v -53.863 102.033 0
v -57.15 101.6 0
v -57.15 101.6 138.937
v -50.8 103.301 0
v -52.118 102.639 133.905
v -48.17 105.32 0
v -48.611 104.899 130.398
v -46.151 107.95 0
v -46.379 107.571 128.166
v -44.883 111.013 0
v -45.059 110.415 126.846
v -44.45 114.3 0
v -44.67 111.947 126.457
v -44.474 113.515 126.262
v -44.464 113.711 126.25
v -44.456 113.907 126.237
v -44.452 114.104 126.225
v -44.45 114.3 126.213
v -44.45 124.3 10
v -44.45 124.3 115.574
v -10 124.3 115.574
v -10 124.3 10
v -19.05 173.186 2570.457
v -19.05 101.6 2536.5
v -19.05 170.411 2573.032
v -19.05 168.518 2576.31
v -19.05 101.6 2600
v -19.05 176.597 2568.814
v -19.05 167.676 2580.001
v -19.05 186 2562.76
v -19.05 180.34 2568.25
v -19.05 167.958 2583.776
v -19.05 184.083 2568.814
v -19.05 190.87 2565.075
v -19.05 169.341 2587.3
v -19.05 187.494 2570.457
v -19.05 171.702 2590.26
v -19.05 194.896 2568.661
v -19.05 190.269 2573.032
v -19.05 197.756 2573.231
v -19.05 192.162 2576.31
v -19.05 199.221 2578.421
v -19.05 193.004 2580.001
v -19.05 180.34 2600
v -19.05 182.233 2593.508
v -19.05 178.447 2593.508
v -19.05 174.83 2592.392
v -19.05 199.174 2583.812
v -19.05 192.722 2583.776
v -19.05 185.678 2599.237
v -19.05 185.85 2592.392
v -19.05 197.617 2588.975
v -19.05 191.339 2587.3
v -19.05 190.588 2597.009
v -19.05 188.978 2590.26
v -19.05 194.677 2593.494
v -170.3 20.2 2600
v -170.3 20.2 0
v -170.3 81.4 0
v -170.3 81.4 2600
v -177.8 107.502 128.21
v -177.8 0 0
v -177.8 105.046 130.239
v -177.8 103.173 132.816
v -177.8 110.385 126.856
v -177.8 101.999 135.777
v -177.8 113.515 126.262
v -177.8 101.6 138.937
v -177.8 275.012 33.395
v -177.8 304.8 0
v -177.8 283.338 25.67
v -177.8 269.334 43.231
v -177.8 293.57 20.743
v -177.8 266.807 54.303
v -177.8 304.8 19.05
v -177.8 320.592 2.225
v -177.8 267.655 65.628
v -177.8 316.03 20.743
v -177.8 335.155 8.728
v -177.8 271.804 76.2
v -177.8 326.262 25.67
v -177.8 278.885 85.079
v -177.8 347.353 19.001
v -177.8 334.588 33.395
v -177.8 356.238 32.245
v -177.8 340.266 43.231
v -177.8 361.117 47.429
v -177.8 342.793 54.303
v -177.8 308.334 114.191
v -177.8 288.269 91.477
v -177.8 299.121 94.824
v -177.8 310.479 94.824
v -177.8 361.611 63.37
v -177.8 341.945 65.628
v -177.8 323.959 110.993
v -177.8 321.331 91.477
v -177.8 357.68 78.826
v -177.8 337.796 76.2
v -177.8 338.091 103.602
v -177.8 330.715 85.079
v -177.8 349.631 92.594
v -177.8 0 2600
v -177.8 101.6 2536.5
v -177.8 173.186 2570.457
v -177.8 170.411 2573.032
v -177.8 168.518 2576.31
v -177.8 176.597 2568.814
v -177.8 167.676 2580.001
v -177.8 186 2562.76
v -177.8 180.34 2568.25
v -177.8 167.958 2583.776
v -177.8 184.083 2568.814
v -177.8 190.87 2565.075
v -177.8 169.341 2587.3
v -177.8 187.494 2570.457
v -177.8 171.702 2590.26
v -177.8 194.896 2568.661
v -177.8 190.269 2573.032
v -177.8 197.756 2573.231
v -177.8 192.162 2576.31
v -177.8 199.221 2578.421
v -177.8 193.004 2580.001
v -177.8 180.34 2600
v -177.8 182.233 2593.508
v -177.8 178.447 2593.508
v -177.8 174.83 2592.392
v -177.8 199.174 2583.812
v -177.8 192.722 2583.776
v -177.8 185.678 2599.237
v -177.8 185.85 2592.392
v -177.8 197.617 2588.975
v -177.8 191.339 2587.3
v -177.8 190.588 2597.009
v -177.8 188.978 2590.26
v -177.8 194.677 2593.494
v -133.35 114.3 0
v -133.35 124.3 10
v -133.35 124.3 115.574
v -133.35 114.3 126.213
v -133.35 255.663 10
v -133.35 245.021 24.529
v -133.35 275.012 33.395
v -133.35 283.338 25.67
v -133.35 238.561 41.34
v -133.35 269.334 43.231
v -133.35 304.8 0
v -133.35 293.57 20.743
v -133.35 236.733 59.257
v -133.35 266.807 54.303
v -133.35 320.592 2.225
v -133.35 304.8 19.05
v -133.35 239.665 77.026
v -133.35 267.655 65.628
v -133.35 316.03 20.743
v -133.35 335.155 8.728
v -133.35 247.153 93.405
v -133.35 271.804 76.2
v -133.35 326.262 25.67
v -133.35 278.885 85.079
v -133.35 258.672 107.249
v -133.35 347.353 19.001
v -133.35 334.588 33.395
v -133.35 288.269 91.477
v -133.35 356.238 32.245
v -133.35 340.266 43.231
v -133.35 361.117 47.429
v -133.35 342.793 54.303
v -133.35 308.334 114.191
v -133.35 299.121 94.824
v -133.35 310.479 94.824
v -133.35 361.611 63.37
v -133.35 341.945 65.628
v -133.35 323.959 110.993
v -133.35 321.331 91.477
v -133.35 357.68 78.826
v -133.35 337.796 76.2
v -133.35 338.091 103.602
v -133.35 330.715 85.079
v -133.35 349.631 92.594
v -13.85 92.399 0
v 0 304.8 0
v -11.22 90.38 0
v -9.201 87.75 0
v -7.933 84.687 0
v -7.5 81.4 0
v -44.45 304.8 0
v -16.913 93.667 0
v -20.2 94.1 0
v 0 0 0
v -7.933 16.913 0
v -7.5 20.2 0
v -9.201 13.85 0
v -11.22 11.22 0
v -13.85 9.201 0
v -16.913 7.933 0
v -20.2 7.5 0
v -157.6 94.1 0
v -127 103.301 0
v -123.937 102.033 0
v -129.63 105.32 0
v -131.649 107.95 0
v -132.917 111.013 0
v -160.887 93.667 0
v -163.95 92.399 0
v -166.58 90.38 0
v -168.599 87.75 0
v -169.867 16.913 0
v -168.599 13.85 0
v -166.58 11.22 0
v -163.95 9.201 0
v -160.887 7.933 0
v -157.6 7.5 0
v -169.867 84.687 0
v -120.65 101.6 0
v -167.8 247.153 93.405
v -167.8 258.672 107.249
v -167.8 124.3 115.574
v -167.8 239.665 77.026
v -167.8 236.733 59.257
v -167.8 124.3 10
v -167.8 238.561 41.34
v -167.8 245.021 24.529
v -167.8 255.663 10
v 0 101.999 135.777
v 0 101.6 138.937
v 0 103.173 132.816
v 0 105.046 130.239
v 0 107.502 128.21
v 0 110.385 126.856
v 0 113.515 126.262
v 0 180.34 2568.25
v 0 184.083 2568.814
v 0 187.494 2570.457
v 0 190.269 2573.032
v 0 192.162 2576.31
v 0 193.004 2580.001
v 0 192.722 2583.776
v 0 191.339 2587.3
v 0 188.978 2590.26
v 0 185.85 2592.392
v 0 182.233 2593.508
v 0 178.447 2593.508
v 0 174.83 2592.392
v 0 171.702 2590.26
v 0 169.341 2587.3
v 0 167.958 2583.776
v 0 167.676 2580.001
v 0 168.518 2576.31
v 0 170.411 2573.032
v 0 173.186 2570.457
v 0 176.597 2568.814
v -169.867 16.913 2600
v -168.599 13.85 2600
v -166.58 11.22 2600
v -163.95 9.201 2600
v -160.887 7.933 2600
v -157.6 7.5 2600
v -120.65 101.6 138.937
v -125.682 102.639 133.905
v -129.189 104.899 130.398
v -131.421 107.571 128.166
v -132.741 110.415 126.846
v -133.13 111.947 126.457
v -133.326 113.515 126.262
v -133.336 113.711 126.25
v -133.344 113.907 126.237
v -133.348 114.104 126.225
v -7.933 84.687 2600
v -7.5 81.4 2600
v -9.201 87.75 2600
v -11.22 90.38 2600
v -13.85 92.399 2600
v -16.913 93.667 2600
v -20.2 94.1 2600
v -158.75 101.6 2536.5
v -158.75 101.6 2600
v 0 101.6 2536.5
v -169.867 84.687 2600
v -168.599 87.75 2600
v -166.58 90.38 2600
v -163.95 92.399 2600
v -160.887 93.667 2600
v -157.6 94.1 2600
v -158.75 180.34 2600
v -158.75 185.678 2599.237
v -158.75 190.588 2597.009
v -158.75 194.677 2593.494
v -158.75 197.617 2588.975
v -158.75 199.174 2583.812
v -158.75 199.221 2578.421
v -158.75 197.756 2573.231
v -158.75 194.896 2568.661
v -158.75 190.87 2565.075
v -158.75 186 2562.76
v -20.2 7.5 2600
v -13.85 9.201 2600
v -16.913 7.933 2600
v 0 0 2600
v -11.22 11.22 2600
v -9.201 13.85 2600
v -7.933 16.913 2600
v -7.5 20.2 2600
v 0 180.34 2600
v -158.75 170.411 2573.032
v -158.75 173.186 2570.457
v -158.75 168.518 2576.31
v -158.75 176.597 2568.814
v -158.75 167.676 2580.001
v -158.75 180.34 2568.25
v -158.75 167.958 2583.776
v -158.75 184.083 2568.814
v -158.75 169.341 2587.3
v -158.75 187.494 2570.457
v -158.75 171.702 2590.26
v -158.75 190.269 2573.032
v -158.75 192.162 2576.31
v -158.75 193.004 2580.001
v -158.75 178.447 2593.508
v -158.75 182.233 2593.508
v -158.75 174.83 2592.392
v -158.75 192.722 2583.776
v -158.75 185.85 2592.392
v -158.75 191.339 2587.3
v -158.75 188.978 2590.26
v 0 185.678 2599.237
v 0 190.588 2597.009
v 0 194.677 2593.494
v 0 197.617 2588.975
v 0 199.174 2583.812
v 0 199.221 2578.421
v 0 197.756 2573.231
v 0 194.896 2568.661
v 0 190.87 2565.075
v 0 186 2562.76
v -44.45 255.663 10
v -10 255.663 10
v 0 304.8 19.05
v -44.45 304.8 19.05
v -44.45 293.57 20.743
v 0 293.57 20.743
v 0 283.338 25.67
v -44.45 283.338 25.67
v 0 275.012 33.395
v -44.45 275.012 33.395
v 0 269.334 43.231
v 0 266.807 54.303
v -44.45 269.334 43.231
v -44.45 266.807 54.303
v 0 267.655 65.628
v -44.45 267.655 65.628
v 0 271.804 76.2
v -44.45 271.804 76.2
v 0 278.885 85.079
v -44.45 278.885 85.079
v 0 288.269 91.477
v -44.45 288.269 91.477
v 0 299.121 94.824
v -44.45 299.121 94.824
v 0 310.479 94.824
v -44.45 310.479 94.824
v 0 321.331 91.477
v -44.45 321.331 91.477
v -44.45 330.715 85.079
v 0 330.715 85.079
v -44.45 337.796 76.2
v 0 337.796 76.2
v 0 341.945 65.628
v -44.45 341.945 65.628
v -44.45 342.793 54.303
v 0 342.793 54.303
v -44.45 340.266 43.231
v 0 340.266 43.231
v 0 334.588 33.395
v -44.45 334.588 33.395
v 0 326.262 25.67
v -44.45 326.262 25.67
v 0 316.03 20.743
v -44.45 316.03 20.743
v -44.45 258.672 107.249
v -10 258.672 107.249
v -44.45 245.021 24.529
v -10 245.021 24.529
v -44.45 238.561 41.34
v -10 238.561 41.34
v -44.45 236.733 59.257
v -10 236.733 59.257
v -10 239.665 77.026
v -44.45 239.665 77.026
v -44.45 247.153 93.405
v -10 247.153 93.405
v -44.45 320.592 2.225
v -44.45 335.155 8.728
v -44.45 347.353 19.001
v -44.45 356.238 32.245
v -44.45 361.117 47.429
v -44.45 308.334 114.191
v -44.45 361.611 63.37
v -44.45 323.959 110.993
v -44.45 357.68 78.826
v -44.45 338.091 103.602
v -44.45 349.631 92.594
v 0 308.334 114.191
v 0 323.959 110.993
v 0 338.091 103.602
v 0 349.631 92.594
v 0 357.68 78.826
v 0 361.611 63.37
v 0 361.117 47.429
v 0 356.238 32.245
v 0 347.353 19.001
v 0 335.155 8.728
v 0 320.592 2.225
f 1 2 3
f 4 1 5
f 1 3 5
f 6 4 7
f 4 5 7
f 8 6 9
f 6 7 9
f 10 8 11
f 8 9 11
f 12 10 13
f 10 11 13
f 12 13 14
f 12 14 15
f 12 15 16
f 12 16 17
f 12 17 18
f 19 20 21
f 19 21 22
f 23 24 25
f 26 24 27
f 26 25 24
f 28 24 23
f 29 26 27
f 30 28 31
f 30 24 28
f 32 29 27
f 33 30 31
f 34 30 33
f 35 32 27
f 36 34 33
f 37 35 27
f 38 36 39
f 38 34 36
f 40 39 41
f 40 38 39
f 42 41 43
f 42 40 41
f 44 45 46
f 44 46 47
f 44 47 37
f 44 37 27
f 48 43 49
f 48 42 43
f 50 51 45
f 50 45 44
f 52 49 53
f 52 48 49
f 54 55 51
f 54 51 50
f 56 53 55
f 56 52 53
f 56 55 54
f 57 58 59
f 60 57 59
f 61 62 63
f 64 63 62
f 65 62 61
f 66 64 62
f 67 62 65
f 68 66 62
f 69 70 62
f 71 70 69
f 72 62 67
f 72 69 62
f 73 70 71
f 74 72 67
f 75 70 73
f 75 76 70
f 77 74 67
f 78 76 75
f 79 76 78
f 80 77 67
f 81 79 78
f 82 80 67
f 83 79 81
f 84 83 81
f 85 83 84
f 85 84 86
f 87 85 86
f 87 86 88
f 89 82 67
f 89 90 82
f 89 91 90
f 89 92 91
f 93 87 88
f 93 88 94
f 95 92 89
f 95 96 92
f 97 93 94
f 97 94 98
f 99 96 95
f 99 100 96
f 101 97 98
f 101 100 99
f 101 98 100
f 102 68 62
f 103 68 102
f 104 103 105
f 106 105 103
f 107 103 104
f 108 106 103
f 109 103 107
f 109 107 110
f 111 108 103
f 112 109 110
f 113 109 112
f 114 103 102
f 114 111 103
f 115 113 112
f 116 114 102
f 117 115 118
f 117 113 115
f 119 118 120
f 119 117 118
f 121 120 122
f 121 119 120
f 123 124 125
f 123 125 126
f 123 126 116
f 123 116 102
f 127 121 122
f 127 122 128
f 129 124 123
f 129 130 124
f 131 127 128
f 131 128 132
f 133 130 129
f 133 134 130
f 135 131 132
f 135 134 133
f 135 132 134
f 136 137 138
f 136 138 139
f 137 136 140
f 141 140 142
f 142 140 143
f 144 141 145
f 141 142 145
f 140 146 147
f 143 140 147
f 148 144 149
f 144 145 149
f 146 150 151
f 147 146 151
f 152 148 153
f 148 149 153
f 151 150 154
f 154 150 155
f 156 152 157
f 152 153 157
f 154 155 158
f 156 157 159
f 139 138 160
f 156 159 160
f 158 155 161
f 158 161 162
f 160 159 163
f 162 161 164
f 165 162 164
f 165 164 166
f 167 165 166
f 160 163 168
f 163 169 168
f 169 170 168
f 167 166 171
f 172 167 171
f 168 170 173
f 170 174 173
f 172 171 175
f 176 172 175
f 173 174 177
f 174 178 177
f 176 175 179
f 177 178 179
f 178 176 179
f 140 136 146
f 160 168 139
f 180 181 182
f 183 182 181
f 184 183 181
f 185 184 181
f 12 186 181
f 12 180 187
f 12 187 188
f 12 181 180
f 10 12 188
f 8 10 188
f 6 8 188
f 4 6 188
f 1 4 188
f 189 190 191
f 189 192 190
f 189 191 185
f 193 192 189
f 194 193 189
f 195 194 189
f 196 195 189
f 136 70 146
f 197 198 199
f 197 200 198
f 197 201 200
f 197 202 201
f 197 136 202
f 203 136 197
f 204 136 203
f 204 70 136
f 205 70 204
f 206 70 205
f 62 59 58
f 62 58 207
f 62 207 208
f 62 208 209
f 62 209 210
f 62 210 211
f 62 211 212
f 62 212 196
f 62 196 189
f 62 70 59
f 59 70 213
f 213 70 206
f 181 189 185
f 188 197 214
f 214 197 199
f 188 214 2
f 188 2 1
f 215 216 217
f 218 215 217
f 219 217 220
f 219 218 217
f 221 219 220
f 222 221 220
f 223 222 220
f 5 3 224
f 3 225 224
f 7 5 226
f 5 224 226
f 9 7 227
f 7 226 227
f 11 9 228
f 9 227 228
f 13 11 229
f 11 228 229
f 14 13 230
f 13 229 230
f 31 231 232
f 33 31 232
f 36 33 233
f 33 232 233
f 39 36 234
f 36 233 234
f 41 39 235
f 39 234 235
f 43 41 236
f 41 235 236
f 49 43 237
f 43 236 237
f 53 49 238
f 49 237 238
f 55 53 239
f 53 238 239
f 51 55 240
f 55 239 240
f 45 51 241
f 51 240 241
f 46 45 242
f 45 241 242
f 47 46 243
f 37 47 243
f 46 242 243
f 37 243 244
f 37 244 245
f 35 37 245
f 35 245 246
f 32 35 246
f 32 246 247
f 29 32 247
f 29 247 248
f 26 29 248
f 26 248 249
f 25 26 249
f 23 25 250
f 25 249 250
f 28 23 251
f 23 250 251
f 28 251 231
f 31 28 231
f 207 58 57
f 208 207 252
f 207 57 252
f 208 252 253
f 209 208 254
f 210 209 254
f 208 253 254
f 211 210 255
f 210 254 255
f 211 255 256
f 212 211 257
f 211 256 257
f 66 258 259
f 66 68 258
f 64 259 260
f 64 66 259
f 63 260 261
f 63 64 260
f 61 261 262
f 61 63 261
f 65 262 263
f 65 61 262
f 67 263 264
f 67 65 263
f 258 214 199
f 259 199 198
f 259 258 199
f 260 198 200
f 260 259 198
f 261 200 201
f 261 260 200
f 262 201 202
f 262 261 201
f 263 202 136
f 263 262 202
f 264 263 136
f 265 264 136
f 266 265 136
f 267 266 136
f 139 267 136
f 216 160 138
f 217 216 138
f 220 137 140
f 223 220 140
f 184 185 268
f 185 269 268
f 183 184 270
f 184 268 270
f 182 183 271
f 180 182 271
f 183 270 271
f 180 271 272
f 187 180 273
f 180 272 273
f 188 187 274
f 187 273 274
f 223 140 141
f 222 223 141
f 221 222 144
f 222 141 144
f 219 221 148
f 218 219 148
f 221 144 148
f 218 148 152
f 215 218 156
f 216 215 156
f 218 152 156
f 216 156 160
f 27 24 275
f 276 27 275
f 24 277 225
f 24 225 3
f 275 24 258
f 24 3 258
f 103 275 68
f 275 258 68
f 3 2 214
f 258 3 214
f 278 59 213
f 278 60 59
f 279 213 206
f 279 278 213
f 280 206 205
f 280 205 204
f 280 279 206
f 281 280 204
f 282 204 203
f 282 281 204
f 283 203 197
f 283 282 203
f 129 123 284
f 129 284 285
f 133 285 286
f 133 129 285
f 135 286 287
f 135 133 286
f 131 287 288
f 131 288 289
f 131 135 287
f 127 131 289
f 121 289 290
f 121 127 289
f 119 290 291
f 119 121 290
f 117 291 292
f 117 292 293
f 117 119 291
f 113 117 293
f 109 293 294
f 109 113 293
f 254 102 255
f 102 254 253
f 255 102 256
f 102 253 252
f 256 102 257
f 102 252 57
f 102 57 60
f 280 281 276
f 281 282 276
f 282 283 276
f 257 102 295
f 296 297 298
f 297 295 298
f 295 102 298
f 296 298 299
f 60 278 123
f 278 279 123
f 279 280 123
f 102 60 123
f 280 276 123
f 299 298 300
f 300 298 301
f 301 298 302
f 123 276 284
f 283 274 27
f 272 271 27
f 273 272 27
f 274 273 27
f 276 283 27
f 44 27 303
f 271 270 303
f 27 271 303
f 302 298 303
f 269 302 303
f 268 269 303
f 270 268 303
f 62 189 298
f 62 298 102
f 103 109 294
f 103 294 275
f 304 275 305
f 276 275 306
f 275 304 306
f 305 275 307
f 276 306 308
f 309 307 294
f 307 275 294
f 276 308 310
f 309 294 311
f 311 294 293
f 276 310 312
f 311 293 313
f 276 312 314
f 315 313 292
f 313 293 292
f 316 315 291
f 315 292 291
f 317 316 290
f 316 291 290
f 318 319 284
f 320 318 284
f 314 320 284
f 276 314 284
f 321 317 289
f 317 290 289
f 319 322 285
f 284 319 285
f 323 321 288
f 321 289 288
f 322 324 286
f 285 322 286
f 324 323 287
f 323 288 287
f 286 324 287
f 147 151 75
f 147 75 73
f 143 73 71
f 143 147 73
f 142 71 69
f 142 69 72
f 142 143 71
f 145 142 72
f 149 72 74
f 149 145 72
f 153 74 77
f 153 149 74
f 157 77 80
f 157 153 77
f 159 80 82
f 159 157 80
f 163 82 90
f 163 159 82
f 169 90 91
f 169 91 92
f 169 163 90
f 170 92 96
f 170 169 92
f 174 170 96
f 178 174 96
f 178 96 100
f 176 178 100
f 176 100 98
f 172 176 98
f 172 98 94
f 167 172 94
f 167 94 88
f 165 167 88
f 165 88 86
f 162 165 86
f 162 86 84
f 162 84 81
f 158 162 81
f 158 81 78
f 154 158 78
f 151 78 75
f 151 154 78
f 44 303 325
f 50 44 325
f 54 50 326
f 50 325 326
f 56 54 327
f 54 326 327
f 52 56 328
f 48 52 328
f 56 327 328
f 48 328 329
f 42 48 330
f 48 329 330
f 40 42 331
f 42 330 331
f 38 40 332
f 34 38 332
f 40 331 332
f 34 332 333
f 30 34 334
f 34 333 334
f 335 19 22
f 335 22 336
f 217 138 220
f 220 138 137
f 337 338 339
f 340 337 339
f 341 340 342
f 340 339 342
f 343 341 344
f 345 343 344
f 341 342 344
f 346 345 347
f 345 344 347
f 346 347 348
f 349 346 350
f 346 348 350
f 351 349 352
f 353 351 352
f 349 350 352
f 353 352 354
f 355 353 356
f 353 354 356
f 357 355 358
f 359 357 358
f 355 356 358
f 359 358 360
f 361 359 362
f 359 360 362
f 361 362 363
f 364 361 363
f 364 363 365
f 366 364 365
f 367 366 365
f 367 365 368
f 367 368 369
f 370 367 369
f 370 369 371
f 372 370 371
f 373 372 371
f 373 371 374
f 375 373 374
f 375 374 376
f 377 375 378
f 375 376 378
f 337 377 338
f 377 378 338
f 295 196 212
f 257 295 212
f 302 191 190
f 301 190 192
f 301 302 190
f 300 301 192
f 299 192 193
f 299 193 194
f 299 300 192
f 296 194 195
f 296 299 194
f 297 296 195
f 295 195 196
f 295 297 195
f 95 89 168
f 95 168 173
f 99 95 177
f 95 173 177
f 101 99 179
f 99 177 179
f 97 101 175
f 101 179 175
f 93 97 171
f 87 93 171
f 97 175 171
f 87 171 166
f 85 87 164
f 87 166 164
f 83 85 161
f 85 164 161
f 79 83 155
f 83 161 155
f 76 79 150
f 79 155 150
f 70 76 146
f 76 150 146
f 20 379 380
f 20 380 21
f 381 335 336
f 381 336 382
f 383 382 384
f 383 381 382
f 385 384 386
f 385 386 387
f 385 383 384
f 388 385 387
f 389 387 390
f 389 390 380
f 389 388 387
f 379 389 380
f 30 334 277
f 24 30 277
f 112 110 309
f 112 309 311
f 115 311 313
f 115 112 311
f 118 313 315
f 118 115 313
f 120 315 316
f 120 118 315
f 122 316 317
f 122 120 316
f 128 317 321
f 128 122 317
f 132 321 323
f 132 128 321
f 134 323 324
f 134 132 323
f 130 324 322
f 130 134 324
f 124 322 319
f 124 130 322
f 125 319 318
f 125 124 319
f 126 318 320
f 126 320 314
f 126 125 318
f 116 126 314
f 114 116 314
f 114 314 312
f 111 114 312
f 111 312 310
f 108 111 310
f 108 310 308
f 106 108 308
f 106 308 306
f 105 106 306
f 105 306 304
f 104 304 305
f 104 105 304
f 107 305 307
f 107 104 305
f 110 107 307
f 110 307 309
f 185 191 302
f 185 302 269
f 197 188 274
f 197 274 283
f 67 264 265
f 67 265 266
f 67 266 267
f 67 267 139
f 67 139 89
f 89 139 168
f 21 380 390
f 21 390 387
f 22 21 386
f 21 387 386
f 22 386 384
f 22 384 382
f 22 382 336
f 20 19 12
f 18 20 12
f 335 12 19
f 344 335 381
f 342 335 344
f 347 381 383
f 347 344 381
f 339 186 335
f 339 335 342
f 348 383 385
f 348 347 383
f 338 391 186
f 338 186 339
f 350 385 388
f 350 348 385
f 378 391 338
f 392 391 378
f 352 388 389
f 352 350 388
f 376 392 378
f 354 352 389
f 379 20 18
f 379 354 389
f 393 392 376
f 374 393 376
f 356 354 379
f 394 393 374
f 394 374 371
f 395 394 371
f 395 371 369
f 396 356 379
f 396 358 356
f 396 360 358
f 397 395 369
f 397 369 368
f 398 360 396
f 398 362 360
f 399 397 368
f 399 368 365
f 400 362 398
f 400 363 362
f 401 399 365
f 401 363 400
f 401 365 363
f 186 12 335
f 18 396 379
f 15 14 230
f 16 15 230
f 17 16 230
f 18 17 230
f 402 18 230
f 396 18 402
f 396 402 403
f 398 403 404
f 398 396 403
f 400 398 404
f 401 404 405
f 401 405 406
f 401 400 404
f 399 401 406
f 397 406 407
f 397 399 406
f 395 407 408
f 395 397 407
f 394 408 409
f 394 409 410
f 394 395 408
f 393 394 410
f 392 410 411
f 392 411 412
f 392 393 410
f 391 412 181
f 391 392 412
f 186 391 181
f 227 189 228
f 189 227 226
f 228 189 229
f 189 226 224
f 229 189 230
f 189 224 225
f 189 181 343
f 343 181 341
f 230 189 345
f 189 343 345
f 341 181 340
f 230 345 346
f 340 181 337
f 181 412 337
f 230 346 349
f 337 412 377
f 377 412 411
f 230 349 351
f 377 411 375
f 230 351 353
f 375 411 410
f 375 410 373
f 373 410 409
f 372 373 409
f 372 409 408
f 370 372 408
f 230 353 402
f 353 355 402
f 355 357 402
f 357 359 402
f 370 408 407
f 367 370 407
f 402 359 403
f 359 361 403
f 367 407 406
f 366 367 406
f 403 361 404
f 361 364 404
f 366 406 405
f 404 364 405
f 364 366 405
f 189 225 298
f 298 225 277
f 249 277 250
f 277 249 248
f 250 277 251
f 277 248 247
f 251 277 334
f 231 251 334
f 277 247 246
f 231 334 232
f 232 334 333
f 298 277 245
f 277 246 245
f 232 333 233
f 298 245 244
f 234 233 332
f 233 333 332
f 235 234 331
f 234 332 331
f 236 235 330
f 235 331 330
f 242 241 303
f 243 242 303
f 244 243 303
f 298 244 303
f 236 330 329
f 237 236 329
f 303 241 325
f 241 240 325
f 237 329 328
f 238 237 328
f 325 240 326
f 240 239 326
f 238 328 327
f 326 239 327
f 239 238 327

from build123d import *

# Parameters (mm, degrees)
SKETCH2_W               = 177.8
SKETCH2_H               = 101.6
SKETCH2_W_2             = 162.8
SKETCH2_H_2             = 86.6
BOSS_EXTRUDE2_DEPTH     = 2600
SKETCH1_R               = 38.1
BOSS_EXTRUDE3_DEPTH     = 44.45
BOSS_EXTRUDE5_START     = -44.45
SKETCH3_R               = 38.1
BOSS_EXTRUDE5_DEPTH     = 44.45
FILLET1_R               = 12.7
FILLET2_R               = 12.7
SKETCH5_R               = 12.7
BOSS_EXTRUDE7_DEPTH     = 19.05
CUT_EXTRUDE1_DEPTH      = 34.45
CUT_EXTRUDE2_DEPTH      = 2620.044665999
CUT_EXTRUDE2_DEPTH_BACK = 2620.044665999
SKETCH9_W               = 88.9
SKETCH9_H               = 2600


with BuildPart() as part:
    # Sketch2 → Boss-Extrude2 (new body)
    with BuildSketch(Plane.XY):
        with Locations((-88.9, 50.8)):
            Rectangle(SKETCH2_W, SKETCH2_H)
        with Locations((-88.9, 50.8)):
            Rectangle(SKETCH2_W_2, SKETCH2_H_2, mode=Mode.SUBTRACT)
    extrude(amount=BOSS_EXTRUDE2_DEPTH)

    # Sketch1 → Boss-Extrude3 (add)
    with BuildSketch(Plane(origin=(0, 0, 0), x_dir=(0, 0, -1), z_dir=(1, 0, 0))):
        with BuildLine():
            Line((-127, 101.6), (0, 101.6))
            Line((0, 101.6), (0, 304.8))
            ThreePointArc((0, 304.8), (-55.382017361, 361.922646449), (-114.190611982, 308.334272869))
            Line((-114.190611982, 308.334272869), (-127, 101.6))
        make_face()
        with Locations((-57.15, 304.8)):
            Circle(SKETCH1_R, mode=Mode.SUBTRACT)
    extrude(amount=-BOSS_EXTRUDE3_DEPTH)

    # Sketch3 → Boss-Extrude5 (add)
    with BuildSketch(Plane.ZY.offset(177.8).offset(BOSS_EXTRUDE5_START)):
        with BuildLine():
            Line((0, 304.8), (0, 101.6))
            Line((0, 101.6), (127, 101.6))
            Line((127, 101.6), (114.190611982, 308.334272869))
            ThreePointArc((114.190611982, 308.334272869), (55.382017361, 361.922646449), (0, 304.8))
        make_face()
        with Locations(Location((57.15, 304.8, 0), (0, 0, 180))):
            Circle(SKETCH3_R, mode=Mode.SUBTRACT)
    extrude(amount=BOSS_EXTRUDE5_DEPTH)

    # Fillet1
    fillet1_edges = [part.edges().sort_by_distance(p)[0] for p in [
        (-7.5, 94.1, 1300),
        (-170.3, 94.1, 1300),
        (-170.3, 7.5, 1300),
        (-7.5, 7.5, 1300),
    ]]
    fillet(fillet1_edges, radius=FILLET1_R)

    # Fillet2
    fillet2_edges = [part.edges().sort_by_distance(p)[0] for p in [
        (-44.45, 101.6, 63.5),
        (-22.225, 101.6, 127),
        (-133.35, 101.6, 63.5),
        (-155.575, 101.6, 127),
    ]]
    fillet(fillet2_edges, radius=FILLET2_R)

    # Sketch5 → Boss-Extrude7 (add)
    with BuildSketch(Plane(origin=(0, 0, 0), x_dir=(0, 0, -1), z_dir=(1, 0, 0))):
        with BuildLine():
            Line((-2600, 101.6), (-2600, 180.34))
            ThreePointArc((-2600, 180.34), (-2583.812295525, 199.173740052), (-2562.760129729, 185.999604185))
            Line((-2562.760129729, 185.999604185), (-2536.5, 101.6))
            Line((-2536.5, 101.6), (-2600, 101.6))
        make_face()
        with Locations((-2580.95, 180.34)):
            Circle(SKETCH5_R, mode=Mode.SUBTRACT)
    boss_extrude7 = extrude(amount=-BOSS_EXTRUDE7_DEPTH)

    # Mirror1: Boss-Extrude7 across plane
    add(boss_extrude7.mirror(Plane.ZY.offset(88.9)))

    # Sketch8 → Cut-Extrude1 (cut)
    with BuildSketch(Plane(origin=(-133.35, 0, 0), x_dir=(0, 0, -1), z_dir=(1, 0, 0))):
        with BuildLine():
            ThreePointArc((-10, 255.662565187), (-59.256729969, 236.73259452), (-107.248511945, 258.672469165))
            Line((-107.248511945, 258.672469165), (-115.574316238, 124.3))
            Line((-115.574316238, 124.3), (-10, 124.3))
            Line((-10, 124.3), (-10, 255.662565187))
        make_face()
    extrude(amount=-CUT_EXTRUDE1_DEPTH, mode=Mode.SUBTRACT)

    # Sketch9 → Cut-Extrude2 (cut, two sides: drawn at the far end of the back side and taken through both)
    with BuildSketch(Plane(origin=(0, 101.6, 0), x_dir=(1, 0, 0), z_dir=(0, 1, 0)).offset(-CUT_EXTRUDE2_DEPTH_BACK)):
        with Locations((-44.45, -1300)):
            Rectangle(SKETCH9_W, SKETCH9_H)
    extrude(amount=CUT_EXTRUDE2_DEPTH + CUT_EXTRUDE2_DEPTH_BACK, mode=Mode.SUBTRACT)

    # Mirror2: part across plane


with BuildPart() as part_1:
    add(part.part)
    add(part.part.mirror(Plane.ZY.offset(88.9)))


solid = part_1.part
